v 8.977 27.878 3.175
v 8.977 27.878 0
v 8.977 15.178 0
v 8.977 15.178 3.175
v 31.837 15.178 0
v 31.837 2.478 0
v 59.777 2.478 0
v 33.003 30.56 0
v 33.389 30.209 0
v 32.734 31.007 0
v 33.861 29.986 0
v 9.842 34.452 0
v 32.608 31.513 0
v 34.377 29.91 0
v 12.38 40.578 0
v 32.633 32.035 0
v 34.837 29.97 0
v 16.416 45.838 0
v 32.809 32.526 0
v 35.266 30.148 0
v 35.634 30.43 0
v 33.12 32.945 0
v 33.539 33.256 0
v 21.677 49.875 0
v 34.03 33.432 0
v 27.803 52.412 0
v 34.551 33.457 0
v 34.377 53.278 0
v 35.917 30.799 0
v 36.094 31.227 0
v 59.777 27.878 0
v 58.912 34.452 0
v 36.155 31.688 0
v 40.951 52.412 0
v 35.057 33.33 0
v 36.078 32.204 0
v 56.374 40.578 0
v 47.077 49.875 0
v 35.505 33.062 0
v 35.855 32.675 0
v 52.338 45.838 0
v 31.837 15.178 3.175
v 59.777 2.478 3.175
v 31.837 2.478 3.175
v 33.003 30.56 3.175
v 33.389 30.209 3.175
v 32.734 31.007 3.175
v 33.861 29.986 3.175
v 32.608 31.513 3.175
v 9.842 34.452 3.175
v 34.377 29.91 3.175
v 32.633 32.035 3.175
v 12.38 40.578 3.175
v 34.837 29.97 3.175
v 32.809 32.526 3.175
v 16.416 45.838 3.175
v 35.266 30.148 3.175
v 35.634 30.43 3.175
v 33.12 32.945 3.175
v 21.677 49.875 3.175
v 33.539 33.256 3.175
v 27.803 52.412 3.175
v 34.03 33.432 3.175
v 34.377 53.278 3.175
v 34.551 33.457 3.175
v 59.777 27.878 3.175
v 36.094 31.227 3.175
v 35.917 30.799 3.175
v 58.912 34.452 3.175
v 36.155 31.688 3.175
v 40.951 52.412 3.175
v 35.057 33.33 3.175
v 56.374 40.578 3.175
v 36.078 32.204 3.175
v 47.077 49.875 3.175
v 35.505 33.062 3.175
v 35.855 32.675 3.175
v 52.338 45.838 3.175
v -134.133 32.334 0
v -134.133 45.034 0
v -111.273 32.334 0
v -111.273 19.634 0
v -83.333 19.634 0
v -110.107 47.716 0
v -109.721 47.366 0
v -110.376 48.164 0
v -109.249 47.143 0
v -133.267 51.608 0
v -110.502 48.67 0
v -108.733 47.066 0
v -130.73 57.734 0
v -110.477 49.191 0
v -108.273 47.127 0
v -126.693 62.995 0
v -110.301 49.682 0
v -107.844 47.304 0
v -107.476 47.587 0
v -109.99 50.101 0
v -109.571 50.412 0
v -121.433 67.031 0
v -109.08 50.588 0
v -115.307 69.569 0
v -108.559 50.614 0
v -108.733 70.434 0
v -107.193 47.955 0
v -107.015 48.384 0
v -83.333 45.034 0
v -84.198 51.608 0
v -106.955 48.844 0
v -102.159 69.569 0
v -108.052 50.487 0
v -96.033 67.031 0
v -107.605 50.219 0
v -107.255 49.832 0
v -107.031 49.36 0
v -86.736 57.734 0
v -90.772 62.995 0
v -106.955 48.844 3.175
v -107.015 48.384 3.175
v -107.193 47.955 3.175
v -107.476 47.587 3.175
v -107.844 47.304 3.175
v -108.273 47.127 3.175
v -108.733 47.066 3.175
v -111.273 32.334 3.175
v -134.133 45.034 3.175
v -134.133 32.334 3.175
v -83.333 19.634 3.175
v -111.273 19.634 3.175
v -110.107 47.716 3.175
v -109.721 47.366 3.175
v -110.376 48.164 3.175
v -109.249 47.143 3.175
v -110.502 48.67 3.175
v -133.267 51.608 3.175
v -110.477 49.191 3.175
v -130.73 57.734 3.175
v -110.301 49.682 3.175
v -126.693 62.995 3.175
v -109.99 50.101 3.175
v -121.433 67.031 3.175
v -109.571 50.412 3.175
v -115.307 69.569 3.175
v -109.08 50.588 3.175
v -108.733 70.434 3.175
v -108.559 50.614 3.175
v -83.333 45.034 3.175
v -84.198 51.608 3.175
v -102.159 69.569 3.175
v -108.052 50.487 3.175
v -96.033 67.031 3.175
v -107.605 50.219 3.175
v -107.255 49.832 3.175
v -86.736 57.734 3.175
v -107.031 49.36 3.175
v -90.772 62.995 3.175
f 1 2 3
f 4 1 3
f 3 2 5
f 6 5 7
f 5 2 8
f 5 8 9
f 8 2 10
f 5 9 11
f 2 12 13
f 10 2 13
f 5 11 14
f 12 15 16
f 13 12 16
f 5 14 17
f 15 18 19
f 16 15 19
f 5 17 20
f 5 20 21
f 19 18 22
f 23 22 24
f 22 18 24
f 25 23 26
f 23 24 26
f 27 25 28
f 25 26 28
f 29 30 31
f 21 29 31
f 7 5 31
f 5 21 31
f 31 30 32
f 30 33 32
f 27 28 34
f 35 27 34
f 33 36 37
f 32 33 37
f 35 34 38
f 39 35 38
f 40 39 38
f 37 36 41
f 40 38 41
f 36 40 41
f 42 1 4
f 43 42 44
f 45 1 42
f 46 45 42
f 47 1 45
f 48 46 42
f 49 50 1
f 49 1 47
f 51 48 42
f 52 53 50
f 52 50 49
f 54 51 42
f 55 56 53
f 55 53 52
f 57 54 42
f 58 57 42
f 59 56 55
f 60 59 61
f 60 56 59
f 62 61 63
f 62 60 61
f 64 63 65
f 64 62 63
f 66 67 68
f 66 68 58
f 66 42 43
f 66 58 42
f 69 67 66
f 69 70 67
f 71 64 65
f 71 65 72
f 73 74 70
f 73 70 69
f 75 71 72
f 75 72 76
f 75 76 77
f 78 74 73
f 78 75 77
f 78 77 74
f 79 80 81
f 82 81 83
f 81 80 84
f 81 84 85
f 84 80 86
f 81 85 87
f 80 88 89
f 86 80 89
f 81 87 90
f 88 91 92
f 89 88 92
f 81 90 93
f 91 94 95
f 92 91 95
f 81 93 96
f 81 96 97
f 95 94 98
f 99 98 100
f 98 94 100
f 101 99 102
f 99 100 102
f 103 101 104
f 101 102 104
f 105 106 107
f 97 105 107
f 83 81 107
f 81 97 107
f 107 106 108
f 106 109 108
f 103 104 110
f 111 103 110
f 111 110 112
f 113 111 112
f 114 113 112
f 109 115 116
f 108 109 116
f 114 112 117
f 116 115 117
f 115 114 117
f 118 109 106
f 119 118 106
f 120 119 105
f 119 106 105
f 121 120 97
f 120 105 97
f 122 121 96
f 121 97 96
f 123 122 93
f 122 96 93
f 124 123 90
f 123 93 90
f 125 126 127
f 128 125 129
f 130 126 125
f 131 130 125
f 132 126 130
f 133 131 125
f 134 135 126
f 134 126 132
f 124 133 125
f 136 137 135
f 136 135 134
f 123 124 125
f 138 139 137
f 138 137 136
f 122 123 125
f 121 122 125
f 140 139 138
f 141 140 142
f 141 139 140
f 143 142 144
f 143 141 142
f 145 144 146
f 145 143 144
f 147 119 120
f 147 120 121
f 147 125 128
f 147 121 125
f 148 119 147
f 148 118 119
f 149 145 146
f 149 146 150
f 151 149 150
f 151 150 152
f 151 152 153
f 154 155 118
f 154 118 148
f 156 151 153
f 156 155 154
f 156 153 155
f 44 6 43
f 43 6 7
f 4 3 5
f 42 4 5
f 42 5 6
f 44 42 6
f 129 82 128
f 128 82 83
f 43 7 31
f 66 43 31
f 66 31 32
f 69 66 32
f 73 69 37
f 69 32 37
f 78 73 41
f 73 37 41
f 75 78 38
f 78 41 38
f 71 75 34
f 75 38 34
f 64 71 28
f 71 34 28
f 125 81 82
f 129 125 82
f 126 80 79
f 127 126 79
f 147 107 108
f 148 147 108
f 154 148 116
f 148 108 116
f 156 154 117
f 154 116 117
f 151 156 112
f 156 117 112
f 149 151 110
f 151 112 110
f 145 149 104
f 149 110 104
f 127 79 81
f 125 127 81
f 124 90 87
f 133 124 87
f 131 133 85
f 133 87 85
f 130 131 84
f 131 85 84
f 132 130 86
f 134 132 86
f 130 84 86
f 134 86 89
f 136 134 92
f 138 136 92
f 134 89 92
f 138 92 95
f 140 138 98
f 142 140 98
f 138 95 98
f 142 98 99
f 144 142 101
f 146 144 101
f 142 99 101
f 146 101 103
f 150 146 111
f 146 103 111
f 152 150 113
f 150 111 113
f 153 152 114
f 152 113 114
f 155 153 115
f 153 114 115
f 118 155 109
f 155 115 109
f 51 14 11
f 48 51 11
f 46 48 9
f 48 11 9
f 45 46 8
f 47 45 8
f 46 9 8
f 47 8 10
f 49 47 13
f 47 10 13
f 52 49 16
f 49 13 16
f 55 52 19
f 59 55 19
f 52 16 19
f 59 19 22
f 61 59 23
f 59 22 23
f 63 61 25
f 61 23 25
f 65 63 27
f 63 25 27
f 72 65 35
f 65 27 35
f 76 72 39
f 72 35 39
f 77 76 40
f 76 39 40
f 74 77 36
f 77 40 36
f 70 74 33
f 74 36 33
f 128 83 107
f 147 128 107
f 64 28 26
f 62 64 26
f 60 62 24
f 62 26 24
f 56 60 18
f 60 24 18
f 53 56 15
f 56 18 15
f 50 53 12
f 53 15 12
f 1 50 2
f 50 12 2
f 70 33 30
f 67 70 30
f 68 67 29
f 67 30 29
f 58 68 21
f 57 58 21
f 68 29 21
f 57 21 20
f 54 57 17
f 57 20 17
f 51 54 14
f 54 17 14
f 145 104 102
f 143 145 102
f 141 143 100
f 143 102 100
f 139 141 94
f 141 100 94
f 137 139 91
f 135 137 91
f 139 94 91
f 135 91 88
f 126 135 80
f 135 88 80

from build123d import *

# Parameters (mm, degrees)
F1_DEPTH = 3.175
F2_DEPTH = 3.175


with BuildPart() as f1:
    # F0 (on Top) → F1 (new body)
    with BuildSketch(Plane.XY):
        with BuildLine():
            Line((-108.732894063, 47.0662403889), (-108.732894063, 19.6342403889))
            Line((-108.732894063, 19.6342403889), (-83.332894063, 19.6342403889))
            Line((-83.332894063, 19.6342403889), (-83.332894063, 45.0342403889))
            ThreePointArc((-83.332894063, 45.0342403889), (-90.7723818209, 62.994752631), (-108.732894063, 70.4342403889))
            Line((-108.732894063, 70.4342403889), (-108.732894063, 50.6222403889))
            ThreePointArc((-108.732894063, 50.6222403889), (-107.475658206, 50.1014762458), (-106.954894063, 48.8442403889))
            ThreePointArc((-106.954894063, 48.8442403889), (-107.475658206, 47.5870045319), (-108.732894063, 47.0662403889))
        make_face()
        with BuildLine():
            Line((-111.272894063, 32.3342403889), (-111.272894063, 19.6342403889))
            Line((-111.272894063, 19.6342403889), (-108.732894063, 19.6342403889))
            Line((-108.732894063, 19.6342403889), (-108.732894063, 47.0662403889))
            ThreePointArc((-108.732894063, 47.0662403889), (-110.510894063, 48.8442403889), (-108.732894063, 50.6222403889))
            Line((-108.732894063, 50.6222403889), (-108.732894063, 70.4342403889))
            ThreePointArc((-108.732894063, 70.4342403889), (-126.6934063051, 62.994752631), (-134.132894063, 45.0342403889))
            Line((-134.132894063, 45.0342403889), (-134.132894063, 32.3342403889))
            Line((-134.132894063, 32.3342403889), (-111.272894063, 32.3342403889))
        make_face()
    extrude(amount=F1_DEPTH)


with BuildPart() as f2:
    # F0 (on Top) → F2 (new body)
    with BuildSketch(Plane.XY):
        with BuildLine():
            Line((34.3770046688, 29.9096776571), (34.3770046688, 2.4776776571))
            Line((34.3770046688, 2.4776776571), (59.7770046688, 2.4776776571))
            Line((59.7770046688, 2.4776776571), (59.7770046688, 27.8776776571))
            ThreePointArc((59.7770046688, 27.8776776571), (52.3375169109, 45.8381898992), (34.3770046688, 53.2776776571))
            Line((34.3770046688, 53.2776776571), (34.3770046688, 33.4656776571))
            ThreePointArc((34.3770046688, 33.4656776571), (35.6342405257, 32.9449135141), (36.1550046688, 31.6876776571))
            ThreePointArc((36.1550046688, 31.6876776571), (35.6342405257, 30.4304418002), (34.3770046688, 29.9096776571))
        make_face()
        with BuildLine():
            Line((31.8370046688, 15.1776776571), (31.8370046688, 2.4776776571))
            Line((31.8370046688, 2.4776776571), (34.3770046688, 2.4776776571))
            Line((34.3770046688, 2.4776776571), (34.3770046688, 29.9096776571))
            ThreePointArc((34.3770046688, 29.9096776571), (32.5990046688, 31.6876776571), (34.3770046688, 33.4656776571))
            Line((34.3770046688, 33.4656776571), (34.3770046688, 53.2776776571))
            ThreePointArc((34.3770046688, 53.2776776571), (16.4164924266, 45.8381898992), (8.9770046688, 27.8776776571))
            Line((8.9770046688, 27.8776776571), (8.9770046688, 15.1776776571))
            Line((8.9770046688, 15.1776776571), (31.8370046688, 15.1776776571))
        make_face()
    extrude(amount=F2_DEPTH)


solid = Compound([f1.part, f2.part])
